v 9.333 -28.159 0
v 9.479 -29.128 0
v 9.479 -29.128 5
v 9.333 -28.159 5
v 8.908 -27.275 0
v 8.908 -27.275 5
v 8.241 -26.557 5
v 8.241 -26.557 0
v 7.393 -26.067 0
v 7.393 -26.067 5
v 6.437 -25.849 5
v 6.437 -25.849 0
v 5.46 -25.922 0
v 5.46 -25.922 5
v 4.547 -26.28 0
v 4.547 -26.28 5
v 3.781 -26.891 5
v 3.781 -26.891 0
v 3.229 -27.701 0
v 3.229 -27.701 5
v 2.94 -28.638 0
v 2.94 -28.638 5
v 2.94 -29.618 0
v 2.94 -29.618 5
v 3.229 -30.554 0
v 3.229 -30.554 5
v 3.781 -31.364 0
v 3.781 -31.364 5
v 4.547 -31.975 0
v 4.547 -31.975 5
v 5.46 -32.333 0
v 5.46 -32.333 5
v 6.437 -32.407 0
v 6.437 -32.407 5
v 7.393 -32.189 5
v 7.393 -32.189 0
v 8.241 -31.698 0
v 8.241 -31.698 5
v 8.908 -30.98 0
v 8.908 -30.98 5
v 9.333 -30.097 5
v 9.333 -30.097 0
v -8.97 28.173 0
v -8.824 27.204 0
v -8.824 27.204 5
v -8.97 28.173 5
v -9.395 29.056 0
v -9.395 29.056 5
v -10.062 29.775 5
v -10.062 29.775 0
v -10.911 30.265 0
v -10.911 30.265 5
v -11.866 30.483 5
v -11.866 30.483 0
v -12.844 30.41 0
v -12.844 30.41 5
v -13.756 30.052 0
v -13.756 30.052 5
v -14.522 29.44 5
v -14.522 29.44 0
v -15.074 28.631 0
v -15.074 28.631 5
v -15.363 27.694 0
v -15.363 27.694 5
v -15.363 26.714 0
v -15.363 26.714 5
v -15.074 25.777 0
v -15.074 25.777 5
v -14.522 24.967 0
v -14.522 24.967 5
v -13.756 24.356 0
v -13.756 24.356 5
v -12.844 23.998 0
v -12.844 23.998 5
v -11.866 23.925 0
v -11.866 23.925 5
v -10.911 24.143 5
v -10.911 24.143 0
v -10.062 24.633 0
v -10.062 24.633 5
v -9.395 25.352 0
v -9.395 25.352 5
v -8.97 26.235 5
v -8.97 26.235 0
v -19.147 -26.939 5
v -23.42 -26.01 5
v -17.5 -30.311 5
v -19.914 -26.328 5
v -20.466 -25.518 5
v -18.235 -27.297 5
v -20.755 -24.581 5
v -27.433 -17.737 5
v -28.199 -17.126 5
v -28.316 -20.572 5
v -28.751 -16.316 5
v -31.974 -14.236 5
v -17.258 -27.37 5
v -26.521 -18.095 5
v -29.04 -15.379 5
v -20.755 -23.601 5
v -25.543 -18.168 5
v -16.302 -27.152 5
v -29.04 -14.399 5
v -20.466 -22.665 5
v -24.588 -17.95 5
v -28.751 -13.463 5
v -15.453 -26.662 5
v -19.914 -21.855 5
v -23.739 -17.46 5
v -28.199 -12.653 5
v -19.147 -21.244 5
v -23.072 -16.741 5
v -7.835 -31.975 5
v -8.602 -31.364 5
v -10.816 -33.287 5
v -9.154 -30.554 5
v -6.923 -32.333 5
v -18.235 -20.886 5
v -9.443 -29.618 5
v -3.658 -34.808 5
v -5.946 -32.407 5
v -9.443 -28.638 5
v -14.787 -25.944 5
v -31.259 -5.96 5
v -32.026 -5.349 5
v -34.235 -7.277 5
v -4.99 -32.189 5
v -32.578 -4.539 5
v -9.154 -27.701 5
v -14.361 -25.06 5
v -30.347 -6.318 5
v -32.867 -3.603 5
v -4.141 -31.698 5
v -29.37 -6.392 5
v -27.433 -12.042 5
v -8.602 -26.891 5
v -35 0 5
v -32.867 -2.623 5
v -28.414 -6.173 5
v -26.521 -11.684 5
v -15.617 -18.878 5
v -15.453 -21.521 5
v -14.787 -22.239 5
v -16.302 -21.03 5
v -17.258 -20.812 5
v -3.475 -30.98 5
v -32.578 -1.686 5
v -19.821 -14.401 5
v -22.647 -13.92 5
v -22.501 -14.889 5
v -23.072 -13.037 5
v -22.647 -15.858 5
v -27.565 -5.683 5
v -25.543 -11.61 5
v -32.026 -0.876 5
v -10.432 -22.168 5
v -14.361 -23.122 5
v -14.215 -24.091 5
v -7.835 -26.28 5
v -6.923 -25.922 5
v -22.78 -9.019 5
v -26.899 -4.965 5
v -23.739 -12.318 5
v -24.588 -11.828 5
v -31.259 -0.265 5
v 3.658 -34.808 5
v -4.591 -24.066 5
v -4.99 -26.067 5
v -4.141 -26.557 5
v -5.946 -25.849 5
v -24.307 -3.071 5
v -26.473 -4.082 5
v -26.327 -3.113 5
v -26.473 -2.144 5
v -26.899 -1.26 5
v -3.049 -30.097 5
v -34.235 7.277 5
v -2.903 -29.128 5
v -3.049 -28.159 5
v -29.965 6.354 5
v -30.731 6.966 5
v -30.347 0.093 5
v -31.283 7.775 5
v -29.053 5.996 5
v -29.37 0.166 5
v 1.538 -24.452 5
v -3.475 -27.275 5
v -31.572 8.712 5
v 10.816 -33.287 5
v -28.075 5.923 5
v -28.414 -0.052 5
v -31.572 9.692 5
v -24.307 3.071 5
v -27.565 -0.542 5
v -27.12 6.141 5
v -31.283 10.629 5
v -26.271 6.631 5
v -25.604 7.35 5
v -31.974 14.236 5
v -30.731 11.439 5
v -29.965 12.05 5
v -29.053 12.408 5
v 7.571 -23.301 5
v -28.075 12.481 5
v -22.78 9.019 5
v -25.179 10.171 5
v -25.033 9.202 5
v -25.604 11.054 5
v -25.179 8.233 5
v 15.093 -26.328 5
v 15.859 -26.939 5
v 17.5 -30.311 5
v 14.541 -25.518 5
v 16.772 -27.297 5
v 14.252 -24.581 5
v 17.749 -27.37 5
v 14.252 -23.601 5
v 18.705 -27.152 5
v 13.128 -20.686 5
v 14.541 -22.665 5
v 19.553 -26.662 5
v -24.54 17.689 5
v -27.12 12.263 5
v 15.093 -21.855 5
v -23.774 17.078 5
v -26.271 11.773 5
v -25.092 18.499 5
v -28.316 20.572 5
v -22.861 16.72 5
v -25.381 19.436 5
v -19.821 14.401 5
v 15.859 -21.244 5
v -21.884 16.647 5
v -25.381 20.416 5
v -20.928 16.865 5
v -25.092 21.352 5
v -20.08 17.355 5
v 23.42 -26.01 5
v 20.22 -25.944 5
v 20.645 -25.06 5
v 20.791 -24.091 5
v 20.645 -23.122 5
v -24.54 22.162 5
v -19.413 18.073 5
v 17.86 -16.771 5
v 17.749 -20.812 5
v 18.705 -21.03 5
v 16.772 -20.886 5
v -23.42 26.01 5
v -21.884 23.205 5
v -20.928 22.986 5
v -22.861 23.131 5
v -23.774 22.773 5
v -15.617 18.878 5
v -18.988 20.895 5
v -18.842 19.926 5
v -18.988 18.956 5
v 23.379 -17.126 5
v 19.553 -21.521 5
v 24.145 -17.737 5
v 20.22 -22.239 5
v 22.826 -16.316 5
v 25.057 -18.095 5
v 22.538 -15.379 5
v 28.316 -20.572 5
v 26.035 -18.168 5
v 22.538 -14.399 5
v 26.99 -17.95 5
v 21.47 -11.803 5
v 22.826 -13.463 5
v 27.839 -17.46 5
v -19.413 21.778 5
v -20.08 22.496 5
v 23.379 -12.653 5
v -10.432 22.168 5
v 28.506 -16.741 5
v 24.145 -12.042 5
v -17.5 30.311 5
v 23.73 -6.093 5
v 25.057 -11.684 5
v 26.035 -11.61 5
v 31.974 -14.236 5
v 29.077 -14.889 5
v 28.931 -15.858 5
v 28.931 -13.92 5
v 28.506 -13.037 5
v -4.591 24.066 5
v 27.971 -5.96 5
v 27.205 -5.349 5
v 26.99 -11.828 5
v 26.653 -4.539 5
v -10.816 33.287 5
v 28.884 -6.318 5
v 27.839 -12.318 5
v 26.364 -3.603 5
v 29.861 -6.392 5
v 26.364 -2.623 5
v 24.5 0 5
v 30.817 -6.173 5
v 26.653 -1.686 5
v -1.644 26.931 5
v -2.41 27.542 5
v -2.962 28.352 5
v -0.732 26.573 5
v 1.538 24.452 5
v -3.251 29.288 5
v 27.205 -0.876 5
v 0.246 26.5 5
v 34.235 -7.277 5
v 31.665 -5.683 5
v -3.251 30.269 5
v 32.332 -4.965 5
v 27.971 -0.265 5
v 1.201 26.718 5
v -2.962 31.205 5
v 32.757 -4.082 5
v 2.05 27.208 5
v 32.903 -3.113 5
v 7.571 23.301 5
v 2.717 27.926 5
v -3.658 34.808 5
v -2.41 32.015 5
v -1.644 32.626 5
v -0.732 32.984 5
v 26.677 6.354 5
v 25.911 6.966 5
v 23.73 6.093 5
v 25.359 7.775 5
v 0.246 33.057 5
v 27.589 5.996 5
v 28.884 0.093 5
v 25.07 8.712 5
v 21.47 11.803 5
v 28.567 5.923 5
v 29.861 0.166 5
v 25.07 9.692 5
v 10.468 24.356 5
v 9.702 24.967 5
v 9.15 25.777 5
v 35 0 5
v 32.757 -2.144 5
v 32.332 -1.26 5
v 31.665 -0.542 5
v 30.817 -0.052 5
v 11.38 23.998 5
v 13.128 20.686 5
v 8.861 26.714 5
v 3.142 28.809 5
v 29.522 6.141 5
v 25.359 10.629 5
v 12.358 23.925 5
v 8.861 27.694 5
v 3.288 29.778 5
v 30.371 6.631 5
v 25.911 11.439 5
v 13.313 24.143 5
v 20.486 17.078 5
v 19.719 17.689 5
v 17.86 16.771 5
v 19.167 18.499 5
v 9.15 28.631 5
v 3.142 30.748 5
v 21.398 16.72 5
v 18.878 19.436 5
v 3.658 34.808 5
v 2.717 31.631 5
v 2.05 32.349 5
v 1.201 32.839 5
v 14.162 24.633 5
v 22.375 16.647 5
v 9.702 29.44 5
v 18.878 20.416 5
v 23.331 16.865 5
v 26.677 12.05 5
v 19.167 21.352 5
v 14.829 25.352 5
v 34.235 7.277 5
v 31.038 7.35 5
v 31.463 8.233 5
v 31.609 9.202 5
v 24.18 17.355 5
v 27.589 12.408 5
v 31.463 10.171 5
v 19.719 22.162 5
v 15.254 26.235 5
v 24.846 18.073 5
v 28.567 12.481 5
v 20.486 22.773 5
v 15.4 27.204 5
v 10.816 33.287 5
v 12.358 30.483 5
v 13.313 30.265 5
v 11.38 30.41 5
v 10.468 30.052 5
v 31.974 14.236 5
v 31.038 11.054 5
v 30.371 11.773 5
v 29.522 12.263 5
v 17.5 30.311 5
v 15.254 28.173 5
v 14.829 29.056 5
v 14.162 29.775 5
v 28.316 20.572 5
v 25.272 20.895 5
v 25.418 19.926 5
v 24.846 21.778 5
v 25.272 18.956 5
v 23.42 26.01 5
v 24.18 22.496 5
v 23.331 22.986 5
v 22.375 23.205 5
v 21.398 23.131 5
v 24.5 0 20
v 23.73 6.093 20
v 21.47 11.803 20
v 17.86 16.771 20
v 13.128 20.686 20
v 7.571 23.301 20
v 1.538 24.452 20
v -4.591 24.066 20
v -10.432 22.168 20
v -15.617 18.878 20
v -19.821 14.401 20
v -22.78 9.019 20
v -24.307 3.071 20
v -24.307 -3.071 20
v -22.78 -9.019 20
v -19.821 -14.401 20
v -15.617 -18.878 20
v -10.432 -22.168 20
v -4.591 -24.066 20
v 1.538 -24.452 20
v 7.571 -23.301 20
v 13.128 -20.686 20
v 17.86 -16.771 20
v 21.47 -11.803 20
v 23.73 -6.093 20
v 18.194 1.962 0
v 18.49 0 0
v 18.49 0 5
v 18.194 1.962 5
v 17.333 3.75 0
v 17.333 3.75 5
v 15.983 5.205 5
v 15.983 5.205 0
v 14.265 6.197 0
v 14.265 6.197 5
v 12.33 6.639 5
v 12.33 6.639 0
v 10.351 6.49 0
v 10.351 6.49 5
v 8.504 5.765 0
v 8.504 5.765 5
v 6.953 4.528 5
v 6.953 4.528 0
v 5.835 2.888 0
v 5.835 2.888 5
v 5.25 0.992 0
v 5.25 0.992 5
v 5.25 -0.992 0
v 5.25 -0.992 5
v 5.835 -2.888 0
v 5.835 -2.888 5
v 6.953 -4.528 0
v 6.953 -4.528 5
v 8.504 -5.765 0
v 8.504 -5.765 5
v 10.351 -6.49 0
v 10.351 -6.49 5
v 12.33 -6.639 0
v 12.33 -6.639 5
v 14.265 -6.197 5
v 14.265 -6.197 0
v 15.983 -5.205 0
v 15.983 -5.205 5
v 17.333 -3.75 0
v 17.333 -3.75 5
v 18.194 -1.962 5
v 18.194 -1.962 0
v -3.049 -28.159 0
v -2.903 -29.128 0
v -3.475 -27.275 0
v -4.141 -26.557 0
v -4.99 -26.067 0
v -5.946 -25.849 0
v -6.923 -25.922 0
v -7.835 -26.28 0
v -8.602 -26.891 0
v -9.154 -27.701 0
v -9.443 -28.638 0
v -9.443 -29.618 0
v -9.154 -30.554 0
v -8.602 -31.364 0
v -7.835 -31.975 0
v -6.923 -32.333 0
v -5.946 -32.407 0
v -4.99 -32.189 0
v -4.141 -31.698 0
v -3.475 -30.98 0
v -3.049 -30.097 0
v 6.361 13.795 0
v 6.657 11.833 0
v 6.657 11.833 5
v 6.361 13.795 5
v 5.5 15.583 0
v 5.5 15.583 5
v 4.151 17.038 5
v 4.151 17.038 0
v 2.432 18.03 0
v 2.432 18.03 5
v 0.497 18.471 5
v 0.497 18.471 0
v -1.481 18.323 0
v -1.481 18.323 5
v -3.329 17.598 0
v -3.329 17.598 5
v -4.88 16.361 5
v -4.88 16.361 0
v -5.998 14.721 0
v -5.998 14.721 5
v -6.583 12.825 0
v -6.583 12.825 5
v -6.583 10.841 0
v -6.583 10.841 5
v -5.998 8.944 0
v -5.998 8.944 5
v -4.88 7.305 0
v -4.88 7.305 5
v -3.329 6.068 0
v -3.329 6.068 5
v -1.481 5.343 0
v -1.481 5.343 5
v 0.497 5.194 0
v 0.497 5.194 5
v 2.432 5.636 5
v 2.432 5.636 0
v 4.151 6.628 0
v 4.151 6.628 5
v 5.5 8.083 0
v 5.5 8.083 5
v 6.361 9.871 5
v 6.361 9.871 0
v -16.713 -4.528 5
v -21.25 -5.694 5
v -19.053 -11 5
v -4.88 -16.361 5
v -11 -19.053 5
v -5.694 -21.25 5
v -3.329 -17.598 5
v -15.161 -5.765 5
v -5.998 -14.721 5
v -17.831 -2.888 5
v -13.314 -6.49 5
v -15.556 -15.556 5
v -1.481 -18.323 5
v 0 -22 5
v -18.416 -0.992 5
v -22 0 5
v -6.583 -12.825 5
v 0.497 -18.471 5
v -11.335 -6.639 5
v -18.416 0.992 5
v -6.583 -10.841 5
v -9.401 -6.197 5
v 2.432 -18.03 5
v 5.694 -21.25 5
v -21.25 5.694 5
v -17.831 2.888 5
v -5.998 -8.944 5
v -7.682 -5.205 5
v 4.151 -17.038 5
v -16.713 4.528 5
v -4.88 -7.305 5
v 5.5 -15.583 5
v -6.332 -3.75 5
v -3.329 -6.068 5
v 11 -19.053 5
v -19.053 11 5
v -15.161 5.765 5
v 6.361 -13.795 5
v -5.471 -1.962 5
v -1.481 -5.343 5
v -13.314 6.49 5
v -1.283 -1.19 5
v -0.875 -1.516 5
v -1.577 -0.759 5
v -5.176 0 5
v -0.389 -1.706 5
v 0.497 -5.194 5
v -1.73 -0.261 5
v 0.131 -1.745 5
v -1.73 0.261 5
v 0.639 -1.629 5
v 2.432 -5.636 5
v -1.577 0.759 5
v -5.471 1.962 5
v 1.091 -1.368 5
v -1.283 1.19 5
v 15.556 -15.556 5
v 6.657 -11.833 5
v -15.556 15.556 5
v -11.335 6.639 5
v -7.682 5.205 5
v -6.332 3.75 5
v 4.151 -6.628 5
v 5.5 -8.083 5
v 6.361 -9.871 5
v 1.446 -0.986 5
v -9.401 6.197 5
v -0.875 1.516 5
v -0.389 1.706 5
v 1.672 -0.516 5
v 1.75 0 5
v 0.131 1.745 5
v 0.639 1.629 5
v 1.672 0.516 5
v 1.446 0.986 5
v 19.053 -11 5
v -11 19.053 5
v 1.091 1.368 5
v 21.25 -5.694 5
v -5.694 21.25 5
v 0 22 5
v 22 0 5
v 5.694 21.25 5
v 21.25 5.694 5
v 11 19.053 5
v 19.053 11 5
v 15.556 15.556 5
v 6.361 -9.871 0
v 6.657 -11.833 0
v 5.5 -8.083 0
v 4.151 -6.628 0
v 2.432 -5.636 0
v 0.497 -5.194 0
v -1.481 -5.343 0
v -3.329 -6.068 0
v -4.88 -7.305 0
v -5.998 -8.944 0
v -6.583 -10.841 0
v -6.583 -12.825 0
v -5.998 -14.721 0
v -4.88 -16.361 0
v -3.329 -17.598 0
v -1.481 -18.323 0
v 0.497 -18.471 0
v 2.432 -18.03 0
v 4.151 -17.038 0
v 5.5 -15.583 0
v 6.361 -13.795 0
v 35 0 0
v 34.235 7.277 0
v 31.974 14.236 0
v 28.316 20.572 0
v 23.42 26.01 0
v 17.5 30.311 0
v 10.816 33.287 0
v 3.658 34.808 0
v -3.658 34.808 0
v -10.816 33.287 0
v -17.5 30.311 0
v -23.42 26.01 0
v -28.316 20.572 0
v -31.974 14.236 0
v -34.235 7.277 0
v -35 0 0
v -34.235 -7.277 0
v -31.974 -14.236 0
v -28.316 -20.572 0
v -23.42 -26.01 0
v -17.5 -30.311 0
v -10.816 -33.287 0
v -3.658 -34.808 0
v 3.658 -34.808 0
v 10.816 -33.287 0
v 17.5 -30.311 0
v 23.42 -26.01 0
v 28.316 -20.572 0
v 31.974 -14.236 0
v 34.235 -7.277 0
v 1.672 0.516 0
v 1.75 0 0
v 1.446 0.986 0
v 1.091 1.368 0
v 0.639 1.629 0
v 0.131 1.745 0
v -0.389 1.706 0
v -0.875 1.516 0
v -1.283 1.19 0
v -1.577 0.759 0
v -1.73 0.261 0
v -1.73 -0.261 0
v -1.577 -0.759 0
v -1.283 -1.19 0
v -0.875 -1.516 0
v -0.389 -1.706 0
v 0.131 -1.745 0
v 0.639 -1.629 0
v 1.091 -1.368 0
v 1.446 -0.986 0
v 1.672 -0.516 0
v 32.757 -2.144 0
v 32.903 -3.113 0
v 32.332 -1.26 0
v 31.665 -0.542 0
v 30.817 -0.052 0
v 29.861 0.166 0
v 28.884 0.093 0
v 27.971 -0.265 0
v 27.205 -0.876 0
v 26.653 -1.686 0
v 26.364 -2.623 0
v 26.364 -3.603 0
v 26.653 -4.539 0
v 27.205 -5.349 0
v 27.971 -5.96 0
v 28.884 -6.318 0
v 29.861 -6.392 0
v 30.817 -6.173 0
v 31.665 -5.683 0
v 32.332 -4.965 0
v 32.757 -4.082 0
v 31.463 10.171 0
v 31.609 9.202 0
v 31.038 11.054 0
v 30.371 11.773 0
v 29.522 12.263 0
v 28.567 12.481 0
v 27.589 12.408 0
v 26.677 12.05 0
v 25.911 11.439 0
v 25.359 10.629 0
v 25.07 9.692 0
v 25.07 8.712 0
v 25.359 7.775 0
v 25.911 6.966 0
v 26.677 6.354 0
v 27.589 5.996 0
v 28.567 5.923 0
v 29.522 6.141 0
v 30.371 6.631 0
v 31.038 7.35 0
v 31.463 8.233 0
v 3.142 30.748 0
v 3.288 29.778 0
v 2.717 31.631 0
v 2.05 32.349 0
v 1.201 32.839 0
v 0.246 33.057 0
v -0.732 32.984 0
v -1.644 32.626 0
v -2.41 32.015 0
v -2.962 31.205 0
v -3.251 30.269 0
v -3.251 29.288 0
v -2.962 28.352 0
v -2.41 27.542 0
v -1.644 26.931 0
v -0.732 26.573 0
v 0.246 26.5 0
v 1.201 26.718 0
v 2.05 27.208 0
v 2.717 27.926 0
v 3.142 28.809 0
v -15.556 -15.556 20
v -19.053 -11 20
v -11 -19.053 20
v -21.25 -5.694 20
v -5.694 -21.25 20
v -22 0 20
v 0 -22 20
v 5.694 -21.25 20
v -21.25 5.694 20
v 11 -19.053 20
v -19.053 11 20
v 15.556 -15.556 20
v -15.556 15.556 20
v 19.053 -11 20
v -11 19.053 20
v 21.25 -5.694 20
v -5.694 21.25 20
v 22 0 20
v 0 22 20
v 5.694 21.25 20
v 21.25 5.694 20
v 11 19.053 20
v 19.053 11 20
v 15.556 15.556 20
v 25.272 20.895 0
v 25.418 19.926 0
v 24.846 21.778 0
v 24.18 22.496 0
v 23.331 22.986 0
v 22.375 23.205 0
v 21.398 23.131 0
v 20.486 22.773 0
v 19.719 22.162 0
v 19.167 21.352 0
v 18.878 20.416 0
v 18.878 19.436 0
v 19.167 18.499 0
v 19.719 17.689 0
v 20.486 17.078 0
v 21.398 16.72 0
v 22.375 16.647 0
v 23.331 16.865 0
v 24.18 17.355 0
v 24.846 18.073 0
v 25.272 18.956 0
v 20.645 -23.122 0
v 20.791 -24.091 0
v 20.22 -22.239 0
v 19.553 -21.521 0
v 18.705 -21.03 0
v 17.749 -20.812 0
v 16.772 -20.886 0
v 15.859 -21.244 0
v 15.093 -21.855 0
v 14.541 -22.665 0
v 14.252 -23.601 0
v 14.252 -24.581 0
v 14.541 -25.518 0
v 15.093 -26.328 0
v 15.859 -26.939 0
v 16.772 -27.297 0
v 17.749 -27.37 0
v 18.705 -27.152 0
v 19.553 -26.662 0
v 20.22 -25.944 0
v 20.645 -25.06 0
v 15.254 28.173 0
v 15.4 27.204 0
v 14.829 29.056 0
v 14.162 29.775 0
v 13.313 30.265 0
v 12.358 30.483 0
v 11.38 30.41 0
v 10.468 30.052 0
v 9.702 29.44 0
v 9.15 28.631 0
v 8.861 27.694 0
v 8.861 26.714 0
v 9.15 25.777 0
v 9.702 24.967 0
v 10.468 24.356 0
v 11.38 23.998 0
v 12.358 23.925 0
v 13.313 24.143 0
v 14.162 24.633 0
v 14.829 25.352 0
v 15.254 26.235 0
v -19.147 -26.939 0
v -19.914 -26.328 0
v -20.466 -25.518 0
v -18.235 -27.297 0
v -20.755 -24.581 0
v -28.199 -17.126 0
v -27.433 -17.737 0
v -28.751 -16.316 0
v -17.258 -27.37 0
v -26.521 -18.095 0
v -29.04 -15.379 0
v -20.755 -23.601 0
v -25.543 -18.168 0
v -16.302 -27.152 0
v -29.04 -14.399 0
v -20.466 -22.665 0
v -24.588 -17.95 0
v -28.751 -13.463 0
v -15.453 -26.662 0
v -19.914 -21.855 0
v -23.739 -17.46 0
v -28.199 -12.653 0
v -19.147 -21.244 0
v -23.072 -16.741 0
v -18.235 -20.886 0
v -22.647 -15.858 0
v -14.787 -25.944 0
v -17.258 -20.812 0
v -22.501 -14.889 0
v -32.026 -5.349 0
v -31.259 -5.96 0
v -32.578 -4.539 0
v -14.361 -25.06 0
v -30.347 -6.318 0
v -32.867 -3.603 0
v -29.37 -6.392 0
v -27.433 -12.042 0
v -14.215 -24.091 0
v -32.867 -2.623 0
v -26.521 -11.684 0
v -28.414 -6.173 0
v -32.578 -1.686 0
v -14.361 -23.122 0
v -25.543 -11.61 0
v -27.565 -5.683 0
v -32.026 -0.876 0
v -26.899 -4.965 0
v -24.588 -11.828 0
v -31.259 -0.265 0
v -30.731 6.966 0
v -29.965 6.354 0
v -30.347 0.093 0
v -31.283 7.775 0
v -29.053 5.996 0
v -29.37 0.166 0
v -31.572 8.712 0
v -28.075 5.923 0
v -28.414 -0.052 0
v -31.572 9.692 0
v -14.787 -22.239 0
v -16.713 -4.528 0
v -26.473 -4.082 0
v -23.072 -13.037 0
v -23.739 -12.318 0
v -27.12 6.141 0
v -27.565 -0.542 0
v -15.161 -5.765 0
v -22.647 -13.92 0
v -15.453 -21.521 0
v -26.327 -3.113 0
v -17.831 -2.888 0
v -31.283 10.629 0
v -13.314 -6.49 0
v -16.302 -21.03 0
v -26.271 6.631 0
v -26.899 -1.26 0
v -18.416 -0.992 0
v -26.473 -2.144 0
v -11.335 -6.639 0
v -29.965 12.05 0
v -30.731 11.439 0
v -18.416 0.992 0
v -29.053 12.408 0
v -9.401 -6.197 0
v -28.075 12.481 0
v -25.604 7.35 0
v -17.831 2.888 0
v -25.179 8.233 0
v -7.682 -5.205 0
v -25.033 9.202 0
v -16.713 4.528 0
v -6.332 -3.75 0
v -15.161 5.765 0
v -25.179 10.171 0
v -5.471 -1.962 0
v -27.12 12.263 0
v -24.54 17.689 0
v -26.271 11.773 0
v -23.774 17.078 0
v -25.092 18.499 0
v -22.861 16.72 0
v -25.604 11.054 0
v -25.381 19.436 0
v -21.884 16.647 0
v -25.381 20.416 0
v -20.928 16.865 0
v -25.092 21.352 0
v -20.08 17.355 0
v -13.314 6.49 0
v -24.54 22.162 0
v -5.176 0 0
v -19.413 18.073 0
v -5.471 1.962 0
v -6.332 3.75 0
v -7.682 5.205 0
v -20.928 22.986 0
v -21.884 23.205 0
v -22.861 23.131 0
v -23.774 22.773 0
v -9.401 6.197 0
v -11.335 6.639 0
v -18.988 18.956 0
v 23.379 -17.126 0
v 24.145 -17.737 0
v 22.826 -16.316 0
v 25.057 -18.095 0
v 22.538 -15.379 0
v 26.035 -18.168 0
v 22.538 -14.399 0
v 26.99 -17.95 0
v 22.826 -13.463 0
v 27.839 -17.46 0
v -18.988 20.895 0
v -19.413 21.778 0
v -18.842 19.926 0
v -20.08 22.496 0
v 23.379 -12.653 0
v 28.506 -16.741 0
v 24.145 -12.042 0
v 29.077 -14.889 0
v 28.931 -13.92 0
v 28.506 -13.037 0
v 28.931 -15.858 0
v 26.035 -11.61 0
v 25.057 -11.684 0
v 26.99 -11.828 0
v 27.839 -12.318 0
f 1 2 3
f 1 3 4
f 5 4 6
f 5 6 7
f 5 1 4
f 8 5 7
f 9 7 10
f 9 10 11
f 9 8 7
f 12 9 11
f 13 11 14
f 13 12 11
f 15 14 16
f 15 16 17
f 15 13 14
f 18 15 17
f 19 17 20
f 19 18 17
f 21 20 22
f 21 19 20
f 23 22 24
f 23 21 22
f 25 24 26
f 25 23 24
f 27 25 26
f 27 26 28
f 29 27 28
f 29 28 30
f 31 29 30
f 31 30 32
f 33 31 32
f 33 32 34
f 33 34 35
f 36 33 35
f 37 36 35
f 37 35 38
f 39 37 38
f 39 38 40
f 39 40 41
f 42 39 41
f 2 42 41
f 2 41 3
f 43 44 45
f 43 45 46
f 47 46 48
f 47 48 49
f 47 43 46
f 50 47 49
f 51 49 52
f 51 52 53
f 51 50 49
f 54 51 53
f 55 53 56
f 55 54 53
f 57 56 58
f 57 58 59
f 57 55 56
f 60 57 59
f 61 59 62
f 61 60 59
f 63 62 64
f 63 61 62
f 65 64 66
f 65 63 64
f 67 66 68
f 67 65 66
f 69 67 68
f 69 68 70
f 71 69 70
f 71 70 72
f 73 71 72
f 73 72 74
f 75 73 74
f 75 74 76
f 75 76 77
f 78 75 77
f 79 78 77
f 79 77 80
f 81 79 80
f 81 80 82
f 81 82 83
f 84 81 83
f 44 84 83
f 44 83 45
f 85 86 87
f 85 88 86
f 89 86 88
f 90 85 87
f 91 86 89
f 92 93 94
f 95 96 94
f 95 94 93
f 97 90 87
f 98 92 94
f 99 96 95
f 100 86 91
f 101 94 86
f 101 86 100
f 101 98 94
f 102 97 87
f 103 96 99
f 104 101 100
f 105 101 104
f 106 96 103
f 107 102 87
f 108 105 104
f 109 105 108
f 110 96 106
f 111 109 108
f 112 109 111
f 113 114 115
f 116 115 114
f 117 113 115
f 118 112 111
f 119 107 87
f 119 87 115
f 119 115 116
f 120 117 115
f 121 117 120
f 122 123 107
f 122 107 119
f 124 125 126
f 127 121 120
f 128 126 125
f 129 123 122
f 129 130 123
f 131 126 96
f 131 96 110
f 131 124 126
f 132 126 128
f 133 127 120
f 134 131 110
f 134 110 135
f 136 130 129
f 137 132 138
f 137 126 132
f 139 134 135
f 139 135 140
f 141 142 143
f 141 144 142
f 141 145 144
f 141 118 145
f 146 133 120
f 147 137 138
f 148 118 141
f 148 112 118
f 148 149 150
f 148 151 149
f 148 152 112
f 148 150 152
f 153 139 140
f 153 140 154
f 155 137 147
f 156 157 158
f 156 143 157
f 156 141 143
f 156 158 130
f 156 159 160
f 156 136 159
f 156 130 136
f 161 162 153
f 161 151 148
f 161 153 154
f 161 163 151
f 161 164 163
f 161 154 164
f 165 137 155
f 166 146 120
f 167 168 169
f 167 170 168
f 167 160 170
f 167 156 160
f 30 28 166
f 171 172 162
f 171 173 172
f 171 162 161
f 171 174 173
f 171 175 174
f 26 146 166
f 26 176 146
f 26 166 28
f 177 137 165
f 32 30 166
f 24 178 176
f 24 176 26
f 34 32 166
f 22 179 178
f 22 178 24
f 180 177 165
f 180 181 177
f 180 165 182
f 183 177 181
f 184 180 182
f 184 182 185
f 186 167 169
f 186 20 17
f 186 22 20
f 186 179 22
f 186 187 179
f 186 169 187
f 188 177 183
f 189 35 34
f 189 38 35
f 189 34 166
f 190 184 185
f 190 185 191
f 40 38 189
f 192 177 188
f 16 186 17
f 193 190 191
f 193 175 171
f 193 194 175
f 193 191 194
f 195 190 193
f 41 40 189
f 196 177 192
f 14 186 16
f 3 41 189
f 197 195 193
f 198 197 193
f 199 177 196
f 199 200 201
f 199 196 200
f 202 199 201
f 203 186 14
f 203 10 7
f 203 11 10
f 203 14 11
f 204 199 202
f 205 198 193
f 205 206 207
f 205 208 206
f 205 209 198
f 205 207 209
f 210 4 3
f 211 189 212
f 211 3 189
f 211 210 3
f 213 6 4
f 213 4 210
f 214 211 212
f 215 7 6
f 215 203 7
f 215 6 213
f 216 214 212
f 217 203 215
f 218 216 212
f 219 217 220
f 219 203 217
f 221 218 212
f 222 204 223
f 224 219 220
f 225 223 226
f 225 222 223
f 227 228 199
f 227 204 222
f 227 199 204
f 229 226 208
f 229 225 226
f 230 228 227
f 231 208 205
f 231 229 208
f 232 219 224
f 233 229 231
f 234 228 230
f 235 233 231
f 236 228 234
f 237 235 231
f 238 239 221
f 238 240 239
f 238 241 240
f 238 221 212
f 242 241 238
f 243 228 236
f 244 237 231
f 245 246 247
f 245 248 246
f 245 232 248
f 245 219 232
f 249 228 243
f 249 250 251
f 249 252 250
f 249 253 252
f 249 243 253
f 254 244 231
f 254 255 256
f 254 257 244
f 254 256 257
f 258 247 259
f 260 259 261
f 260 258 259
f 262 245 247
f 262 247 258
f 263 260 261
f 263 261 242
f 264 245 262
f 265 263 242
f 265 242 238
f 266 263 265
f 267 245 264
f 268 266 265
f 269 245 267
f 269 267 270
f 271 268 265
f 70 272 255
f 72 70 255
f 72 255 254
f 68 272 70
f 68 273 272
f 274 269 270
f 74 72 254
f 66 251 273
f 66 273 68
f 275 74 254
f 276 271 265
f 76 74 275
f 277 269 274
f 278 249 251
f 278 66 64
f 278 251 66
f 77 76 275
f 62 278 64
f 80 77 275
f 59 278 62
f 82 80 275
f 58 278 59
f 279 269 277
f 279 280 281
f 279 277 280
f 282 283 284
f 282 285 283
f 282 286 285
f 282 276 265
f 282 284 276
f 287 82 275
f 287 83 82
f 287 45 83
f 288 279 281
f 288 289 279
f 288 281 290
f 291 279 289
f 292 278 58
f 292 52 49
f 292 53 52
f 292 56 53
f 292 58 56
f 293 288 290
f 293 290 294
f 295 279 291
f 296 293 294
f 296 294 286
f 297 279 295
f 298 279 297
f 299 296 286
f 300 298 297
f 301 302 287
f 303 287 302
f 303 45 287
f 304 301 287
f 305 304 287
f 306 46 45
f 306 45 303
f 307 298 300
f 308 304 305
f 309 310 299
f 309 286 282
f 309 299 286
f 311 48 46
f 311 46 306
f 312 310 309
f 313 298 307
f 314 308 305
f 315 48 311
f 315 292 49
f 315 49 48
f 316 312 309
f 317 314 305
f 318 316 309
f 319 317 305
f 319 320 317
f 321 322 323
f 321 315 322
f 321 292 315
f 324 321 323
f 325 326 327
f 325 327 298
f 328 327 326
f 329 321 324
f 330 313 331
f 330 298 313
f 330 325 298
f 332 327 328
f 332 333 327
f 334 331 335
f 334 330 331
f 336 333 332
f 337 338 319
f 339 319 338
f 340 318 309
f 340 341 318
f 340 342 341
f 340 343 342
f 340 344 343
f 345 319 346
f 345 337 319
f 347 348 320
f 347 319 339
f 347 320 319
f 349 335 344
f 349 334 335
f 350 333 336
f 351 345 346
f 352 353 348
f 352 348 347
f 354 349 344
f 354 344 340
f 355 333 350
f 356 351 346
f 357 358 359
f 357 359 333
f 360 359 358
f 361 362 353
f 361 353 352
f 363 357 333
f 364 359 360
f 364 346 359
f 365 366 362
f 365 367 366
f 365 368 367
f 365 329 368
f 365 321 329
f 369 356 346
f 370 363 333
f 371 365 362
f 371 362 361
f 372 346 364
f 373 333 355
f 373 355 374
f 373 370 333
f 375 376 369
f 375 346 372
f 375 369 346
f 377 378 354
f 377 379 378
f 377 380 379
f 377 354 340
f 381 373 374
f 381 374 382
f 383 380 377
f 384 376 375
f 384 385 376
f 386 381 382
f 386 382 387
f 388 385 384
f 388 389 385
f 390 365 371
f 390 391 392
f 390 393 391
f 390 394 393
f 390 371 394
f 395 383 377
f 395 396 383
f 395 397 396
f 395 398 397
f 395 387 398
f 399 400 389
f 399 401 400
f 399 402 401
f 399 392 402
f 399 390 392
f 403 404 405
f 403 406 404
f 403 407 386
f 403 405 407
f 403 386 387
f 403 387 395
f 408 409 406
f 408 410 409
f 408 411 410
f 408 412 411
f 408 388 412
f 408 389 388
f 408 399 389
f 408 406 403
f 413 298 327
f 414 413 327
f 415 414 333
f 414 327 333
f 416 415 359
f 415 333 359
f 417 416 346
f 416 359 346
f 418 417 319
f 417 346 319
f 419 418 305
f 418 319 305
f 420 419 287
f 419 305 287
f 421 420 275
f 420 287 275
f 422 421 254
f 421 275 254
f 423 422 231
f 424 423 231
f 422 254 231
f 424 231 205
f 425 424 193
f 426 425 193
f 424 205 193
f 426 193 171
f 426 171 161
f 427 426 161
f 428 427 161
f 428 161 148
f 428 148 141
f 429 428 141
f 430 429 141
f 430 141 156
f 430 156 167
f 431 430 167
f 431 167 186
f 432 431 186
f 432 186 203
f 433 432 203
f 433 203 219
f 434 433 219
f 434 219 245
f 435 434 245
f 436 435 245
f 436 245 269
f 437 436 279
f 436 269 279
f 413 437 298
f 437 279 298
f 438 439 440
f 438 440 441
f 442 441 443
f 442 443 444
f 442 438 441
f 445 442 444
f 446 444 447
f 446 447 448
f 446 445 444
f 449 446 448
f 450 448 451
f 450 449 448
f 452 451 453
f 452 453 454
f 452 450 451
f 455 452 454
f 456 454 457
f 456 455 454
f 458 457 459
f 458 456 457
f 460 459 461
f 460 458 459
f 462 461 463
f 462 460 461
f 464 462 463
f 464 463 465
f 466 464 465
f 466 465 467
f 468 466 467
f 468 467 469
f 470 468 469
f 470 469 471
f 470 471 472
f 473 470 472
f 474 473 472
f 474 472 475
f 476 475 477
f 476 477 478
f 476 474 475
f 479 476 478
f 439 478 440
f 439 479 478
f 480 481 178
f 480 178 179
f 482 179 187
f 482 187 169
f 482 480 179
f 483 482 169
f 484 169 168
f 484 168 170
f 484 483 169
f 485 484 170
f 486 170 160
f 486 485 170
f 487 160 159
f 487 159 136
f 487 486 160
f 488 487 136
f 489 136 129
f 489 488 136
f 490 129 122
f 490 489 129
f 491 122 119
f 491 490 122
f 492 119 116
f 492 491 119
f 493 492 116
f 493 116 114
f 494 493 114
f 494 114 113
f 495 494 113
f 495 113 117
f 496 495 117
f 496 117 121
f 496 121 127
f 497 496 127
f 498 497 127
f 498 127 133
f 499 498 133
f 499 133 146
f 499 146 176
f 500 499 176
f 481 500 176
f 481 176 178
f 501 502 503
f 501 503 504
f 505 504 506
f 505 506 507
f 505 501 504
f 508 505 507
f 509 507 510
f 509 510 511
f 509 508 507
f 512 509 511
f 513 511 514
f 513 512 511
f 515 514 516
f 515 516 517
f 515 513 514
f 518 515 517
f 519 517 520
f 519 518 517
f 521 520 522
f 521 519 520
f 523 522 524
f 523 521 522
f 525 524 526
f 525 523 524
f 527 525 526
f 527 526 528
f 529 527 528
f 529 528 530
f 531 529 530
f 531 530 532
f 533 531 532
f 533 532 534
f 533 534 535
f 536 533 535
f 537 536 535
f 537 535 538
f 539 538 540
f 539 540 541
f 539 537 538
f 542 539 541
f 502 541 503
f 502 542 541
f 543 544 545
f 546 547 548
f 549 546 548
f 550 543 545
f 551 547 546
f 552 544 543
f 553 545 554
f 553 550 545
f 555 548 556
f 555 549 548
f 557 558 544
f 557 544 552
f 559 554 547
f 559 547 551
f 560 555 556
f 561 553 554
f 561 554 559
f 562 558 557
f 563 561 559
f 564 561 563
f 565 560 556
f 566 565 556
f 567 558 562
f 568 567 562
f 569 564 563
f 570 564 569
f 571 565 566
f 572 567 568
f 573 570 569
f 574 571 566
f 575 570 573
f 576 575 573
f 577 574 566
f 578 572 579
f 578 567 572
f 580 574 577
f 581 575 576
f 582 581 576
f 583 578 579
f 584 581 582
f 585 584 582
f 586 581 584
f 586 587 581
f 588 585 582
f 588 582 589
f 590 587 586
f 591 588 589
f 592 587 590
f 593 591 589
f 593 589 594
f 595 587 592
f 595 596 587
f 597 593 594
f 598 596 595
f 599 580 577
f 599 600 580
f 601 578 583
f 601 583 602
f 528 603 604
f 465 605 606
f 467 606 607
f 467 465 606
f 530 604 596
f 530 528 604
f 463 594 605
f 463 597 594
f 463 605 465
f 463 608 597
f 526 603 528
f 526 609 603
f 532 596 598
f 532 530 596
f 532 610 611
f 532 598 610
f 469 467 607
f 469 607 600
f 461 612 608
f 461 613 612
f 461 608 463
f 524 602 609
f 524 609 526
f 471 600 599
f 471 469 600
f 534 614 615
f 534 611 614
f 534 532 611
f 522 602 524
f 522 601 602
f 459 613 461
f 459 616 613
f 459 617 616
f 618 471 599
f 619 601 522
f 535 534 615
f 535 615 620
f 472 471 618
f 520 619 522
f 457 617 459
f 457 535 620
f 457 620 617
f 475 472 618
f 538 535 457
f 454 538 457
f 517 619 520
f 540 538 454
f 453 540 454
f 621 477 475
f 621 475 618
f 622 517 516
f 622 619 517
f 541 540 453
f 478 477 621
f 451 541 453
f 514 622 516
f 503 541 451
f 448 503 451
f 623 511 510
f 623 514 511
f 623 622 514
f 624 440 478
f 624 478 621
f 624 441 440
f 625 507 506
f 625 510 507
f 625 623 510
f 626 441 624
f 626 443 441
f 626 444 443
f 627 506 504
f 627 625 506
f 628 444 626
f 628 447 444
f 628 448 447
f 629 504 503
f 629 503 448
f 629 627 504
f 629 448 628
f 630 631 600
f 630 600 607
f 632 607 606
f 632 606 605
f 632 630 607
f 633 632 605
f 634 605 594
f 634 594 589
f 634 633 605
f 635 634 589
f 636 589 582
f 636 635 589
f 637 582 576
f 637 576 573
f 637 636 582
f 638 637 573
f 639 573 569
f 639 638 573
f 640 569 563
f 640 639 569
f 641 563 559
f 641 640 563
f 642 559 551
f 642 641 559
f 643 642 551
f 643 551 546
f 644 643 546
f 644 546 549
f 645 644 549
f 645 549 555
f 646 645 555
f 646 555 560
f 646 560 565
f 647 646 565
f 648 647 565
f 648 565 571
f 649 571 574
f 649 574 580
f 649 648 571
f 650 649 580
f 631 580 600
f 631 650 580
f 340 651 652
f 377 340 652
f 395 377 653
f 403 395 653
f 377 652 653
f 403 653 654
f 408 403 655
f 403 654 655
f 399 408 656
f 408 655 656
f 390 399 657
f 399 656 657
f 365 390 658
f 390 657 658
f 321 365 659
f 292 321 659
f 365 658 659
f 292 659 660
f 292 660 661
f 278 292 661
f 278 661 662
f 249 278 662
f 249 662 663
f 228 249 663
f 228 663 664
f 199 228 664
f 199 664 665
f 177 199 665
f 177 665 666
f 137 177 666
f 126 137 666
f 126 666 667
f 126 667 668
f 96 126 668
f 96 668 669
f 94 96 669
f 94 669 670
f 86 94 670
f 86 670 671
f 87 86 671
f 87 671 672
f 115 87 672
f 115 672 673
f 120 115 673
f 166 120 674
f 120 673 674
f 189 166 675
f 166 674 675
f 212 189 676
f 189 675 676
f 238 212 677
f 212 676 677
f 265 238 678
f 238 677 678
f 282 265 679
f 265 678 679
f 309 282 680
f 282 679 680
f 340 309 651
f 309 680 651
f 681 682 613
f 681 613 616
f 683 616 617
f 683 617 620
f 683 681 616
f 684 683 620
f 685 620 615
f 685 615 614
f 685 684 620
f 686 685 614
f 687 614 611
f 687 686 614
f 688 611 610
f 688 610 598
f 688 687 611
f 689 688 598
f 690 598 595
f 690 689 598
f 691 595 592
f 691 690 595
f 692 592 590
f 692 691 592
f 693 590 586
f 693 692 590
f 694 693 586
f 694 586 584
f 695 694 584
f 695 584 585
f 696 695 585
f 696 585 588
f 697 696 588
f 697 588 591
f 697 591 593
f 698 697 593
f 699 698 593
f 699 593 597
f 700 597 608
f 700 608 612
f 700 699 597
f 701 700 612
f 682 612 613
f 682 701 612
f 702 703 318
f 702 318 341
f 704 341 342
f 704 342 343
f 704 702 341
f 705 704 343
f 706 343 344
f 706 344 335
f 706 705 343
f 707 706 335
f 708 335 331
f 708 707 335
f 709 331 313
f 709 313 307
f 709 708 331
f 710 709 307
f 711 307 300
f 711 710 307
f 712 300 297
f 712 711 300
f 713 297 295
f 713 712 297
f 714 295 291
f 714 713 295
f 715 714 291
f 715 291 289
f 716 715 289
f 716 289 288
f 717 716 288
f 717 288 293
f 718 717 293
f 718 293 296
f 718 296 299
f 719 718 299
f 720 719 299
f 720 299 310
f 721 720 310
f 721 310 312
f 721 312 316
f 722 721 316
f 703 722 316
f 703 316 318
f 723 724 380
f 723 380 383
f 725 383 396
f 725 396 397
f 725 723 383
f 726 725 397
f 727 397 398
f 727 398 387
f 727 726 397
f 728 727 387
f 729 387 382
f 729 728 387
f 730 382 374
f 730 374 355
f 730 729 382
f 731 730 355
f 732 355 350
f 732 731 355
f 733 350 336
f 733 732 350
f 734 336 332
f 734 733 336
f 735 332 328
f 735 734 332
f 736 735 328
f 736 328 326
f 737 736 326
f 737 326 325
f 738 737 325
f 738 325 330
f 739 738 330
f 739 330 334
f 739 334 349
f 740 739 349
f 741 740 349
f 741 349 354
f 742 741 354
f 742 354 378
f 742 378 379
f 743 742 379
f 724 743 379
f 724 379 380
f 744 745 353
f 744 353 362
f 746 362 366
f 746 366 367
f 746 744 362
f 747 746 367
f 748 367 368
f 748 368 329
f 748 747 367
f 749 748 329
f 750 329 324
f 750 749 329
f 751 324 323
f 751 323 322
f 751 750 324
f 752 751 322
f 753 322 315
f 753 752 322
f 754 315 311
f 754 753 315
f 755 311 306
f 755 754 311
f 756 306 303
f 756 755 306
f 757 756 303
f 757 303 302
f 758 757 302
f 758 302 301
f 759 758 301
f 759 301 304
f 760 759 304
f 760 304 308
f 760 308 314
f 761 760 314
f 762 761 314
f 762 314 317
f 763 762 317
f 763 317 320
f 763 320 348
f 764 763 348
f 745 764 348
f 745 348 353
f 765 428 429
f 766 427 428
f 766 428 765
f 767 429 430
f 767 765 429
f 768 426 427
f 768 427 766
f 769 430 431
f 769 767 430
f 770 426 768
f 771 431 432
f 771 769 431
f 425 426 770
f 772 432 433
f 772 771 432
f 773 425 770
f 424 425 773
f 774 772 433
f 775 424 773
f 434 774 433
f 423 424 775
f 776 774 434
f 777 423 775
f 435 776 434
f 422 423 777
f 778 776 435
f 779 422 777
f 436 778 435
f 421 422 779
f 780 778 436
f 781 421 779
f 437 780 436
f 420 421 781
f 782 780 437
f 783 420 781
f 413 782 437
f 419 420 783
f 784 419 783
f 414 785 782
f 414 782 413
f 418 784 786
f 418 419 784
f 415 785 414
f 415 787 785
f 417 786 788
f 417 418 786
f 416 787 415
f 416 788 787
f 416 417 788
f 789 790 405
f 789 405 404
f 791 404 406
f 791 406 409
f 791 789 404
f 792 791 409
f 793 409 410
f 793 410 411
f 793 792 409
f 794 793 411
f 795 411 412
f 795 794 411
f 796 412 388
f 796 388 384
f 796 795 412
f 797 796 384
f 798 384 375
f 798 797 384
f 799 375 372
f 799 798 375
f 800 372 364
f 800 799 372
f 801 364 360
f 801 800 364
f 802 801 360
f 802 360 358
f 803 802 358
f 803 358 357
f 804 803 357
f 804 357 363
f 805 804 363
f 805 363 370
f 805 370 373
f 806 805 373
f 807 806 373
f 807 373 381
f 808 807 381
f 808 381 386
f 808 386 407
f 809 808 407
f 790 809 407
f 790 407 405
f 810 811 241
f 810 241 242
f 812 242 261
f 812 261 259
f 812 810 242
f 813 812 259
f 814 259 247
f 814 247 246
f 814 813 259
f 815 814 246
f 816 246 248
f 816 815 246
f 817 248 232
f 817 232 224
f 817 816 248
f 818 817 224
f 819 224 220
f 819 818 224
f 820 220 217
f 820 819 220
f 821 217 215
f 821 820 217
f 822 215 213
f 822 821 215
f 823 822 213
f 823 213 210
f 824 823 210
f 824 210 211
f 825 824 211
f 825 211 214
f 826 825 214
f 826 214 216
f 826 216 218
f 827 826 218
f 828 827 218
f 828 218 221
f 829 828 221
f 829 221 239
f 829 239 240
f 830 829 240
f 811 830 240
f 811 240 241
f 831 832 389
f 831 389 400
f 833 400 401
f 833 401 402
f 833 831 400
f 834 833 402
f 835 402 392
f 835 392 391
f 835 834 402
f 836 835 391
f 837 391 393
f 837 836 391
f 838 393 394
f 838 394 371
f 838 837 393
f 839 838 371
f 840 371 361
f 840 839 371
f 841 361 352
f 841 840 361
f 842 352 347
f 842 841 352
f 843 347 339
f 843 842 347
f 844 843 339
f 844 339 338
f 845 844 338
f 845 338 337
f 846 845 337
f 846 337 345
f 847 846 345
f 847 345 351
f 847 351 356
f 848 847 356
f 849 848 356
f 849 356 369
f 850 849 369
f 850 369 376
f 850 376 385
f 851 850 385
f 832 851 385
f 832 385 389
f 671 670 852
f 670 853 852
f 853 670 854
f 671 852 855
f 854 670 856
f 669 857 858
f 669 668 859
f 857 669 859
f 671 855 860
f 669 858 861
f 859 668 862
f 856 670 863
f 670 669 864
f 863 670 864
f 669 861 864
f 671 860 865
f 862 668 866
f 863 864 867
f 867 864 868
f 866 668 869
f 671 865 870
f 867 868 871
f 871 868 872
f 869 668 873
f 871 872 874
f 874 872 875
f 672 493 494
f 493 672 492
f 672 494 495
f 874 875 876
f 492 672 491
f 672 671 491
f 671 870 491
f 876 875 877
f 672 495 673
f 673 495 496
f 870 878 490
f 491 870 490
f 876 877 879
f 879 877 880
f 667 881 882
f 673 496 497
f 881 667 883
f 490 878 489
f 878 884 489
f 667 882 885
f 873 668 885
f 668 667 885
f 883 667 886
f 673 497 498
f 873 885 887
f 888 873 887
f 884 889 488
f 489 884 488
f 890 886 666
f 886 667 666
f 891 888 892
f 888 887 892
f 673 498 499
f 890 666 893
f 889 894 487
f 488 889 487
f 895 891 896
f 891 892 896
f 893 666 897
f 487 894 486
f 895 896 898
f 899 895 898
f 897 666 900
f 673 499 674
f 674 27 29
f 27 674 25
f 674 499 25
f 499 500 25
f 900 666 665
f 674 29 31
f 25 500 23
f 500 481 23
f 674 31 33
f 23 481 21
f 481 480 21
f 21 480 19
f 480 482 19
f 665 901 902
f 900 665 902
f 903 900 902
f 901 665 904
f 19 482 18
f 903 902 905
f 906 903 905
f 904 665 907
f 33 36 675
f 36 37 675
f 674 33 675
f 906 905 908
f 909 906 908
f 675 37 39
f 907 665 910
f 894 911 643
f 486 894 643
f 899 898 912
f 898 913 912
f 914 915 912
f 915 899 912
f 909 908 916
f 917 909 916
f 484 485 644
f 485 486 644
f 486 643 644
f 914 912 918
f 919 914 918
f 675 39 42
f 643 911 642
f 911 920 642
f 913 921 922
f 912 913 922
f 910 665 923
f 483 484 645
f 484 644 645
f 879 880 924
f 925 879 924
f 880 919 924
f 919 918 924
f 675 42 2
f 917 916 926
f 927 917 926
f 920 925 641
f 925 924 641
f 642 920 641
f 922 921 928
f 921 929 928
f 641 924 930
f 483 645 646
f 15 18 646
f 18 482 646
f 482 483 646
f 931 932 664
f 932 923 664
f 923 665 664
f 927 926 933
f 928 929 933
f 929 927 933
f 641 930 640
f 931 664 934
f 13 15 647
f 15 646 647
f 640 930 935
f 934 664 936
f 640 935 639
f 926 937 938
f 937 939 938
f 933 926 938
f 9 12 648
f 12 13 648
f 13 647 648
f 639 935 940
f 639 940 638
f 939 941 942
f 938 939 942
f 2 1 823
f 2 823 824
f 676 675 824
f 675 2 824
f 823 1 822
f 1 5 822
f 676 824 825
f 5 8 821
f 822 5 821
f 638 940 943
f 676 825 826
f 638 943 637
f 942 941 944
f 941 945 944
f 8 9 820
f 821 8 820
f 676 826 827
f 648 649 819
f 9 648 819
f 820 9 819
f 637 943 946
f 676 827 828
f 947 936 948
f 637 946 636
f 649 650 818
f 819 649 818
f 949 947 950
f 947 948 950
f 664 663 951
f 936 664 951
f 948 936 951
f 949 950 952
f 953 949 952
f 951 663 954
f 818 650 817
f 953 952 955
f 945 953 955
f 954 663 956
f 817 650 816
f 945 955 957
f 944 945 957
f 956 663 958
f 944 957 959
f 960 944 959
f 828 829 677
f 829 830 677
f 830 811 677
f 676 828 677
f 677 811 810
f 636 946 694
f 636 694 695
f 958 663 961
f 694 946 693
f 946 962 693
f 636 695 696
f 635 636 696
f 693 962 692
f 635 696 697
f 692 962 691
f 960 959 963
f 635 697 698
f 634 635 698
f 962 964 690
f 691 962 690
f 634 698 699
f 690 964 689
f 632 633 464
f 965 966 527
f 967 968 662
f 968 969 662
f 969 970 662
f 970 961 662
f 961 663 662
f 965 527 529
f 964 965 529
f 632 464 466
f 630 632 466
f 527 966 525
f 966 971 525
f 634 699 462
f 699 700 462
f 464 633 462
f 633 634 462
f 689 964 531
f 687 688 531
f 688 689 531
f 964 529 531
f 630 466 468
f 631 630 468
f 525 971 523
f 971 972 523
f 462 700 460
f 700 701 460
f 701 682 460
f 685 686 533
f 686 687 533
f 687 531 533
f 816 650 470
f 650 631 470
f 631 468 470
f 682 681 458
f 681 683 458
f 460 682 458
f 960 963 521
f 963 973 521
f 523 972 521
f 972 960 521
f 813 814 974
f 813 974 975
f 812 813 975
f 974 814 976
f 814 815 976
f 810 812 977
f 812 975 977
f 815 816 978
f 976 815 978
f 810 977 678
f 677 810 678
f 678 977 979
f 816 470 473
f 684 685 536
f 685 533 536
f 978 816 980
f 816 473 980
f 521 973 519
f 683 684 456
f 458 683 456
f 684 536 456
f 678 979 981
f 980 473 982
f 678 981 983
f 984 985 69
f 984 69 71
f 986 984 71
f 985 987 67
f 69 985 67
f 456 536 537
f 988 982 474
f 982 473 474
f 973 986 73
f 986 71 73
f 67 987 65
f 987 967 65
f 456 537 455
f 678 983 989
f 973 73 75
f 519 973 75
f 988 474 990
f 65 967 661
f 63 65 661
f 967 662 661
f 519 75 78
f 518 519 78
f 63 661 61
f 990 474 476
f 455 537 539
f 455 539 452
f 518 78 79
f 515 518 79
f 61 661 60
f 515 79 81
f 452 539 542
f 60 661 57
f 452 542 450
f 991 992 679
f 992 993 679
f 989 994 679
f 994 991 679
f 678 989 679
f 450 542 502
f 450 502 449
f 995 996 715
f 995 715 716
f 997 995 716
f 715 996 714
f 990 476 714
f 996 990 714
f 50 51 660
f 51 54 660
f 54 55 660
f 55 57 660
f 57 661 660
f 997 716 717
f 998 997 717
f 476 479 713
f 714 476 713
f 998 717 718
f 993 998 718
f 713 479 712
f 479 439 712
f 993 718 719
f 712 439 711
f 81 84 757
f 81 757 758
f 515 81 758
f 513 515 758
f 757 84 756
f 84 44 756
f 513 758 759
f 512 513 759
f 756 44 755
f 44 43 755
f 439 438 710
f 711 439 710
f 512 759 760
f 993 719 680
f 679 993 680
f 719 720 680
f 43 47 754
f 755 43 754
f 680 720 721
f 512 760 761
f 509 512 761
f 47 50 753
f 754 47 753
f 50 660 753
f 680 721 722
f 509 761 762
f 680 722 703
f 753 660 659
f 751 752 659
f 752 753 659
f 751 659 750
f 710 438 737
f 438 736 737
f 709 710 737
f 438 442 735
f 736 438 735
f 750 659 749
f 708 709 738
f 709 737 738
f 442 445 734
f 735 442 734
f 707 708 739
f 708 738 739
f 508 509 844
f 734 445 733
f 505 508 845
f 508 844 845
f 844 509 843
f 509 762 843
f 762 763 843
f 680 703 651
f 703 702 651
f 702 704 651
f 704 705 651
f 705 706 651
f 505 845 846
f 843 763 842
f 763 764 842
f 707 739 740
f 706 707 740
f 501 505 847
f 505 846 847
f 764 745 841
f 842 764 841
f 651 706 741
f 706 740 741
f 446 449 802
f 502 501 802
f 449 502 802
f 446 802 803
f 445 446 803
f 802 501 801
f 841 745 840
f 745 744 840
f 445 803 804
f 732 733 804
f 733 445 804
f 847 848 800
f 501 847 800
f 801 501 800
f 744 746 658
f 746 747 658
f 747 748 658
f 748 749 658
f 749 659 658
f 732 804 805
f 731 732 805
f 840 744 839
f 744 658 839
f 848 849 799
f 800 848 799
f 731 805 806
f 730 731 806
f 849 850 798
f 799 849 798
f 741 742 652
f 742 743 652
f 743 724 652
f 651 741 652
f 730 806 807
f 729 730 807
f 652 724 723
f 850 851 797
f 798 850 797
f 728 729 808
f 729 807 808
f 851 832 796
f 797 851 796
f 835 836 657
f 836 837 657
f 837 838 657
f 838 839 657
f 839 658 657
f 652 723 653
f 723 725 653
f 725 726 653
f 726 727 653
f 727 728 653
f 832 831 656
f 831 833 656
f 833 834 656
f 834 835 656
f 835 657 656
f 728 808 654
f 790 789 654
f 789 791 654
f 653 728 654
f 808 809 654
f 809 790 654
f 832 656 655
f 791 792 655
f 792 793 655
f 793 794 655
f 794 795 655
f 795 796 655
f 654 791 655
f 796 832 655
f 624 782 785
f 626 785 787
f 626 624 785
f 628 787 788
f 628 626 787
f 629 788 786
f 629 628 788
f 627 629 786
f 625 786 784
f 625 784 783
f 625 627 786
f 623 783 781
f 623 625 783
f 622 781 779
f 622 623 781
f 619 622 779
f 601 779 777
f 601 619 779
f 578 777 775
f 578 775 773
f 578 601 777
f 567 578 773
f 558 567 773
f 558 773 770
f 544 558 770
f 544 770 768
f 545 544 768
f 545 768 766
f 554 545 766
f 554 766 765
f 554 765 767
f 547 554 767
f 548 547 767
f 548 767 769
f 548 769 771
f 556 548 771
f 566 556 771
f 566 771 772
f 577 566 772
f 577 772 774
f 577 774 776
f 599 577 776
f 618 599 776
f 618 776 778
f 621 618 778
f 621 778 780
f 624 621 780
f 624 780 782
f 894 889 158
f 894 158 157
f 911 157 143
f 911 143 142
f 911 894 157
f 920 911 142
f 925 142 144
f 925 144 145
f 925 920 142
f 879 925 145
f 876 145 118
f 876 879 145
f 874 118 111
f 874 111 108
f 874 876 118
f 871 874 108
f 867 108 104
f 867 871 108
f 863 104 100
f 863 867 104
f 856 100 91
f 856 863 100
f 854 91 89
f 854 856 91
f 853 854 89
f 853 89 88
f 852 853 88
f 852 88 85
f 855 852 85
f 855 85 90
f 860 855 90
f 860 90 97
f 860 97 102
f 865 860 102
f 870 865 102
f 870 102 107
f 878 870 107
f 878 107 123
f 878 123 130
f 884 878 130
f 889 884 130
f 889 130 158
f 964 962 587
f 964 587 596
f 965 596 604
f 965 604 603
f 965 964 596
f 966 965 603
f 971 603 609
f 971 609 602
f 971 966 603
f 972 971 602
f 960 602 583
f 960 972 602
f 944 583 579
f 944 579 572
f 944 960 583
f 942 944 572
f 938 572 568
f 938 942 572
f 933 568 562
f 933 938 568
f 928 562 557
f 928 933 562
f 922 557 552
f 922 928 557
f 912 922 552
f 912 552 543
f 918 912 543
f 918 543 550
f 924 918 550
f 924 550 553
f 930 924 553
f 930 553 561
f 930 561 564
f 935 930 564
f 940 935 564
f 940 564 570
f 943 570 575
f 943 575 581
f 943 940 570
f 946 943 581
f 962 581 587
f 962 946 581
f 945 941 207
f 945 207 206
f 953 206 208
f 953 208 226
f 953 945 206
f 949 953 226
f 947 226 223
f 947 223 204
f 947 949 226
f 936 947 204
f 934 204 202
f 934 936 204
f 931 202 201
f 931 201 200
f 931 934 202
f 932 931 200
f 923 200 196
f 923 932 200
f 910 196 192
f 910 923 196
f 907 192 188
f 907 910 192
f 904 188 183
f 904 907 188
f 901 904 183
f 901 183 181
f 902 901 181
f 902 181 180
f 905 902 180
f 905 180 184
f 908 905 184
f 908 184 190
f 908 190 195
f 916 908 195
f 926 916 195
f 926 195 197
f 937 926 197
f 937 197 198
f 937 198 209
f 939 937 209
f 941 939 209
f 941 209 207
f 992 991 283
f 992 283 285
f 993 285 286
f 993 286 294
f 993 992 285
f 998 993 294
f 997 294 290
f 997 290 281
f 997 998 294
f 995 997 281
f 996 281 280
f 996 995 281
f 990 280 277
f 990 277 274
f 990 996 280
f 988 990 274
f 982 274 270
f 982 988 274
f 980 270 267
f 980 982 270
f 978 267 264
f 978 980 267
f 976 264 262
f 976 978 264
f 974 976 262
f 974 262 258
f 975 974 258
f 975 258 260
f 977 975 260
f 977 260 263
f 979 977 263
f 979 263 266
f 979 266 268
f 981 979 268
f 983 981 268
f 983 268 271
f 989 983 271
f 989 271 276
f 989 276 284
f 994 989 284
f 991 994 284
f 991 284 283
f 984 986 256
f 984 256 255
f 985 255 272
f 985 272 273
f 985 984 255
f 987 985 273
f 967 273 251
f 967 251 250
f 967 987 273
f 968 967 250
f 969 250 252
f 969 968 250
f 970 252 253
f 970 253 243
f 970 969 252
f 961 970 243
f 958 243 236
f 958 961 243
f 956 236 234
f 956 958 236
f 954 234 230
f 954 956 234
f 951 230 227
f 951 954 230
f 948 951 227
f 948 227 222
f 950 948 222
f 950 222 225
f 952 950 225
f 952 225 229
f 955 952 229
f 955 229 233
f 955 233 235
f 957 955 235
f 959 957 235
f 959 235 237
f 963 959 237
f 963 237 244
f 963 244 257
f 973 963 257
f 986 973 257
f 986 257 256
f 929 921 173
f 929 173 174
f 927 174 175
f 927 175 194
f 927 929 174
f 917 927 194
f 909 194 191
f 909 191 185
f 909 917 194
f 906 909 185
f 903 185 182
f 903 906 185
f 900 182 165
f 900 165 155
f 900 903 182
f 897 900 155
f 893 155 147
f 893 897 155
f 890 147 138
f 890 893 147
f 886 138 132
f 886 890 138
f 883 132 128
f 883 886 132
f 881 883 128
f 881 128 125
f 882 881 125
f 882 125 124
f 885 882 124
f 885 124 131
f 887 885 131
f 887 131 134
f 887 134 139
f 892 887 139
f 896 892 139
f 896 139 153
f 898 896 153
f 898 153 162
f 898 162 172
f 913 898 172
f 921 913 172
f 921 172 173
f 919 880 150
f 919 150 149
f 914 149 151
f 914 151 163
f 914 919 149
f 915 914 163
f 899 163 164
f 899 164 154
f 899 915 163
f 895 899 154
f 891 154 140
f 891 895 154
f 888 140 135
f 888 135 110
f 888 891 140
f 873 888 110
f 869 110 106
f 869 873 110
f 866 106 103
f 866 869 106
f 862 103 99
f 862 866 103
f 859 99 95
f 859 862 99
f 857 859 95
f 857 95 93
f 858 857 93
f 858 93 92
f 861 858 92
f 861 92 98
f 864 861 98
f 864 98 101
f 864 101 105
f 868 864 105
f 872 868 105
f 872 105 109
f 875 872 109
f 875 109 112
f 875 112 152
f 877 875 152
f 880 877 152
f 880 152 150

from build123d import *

# Parameters (mm, degrees)
F0_R     = 35
F0_R_2   = 3.2880949383
F0_R_3   = 24.5
F0_R_4   = 22
F0_R_5   = 6.6571375288
F0_R_6   = 1.75
F1_DEPTH = 5
F2_DEPTH = 20
F3_DEPTH = 3


with BuildPart() as f1:
    # F0 (on Top) → F1 (new body)
    with BuildSketch(Plane.XY):
        Circle(F0_R)
        with Locations((-17.5033363634, -24.0912757185)):
            Circle(F0_R_2, mode=Mode.SUBTRACT)
        with Locations((-6.1912888152, -29.1277237765)):
            Circle(F0_R_2, mode=Mode.SUBTRACT)
        with Locations((-25.7888980415, -14.8892272264)):
            Circle(F0_R_2, mode=Mode.SUBTRACT)
        with Locations((-29.6153249635, -3.1126960824)):
            Circle(F0_R_2, mode=Mode.SUBTRACT)
        with Locations((6.1912888152, -29.1277237765)):
            Circle(F0_R_2, mode=Mode.SUBTRACT)
        with Locations((17.5033363634, -24.0912757185)):
            Circle(F0_R_2, mode=Mode.SUBTRACT)
        with Locations((25.7888980415, -14.8892272264)):
            Circle(F0_R_2, mode=Mode.SUBTRACT)
        with Locations((29.6153249635, -3.1126960824)):
            Circle(F0_R_2, mode=Mode.SUBTRACT)
        with Locations((-28.3209931525, 9.2020484921)):
            Circle(F0_R_2, mode=Mode.SUBTRACT)
        with Locations((-22.1297043373, 19.9256752844)):
            Circle(F0_R_2, mode=Mode.SUBTRACT)
        with Locations((-12.1119886001, 27.2039718009)):
            Circle(F0_R_2, mode=Mode.SUBTRACT)
        Circle(F0_R_3, mode=Mode.SUBTRACT)
        with Locations((28.3209931525, 9.2020484921)):
            Circle(F0_R_2, mode=Mode.SUBTRACT)
        with Locations((0, 29.7784544528)):
            Circle(F0_R_2, mode=Mode.SUBTRACT)
        with Locations((12.1119886001, 27.2039718009)):
            Circle(F0_R_2, mode=Mode.SUBTRACT)
        with Locations((22.1297043373, 19.9256752844)):
            Circle(F0_R_2, mode=Mode.SUBTRACT)
        Circle(F0_R_3)
        Circle(F0_R_4, mode=Mode.SUBTRACT)
        Circle(F0_R_4)
        with Locations((0, -11.8328090757)):
            Circle(F0_R_5, mode=Mode.SUBTRACT)
        with Locations((-11.8328090757, 0)):
            Circle(F0_R_5, mode=Mode.SUBTRACT)
        Circle(F0_R_6, mode=Mode.SUBTRACT)
        with Locations((11.8328090757, 0)):
            Circle(F0_R_5, mode=Mode.SUBTRACT)
        with Locations((0, 11.8328090757)):
            Circle(F0_R_5, mode=Mode.SUBTRACT)
    extrude(amount=F1_DEPTH)

    # F0 (on Top) → F2 (join)
    with BuildSketch(Plane.XY):
        Circle(F0_R_3)
        Circle(F0_R_4, mode=Mode.SUBTRACT)
    extrude(amount=F2_DEPTH)

    # F0 (on Top) → F3 (join)
    with BuildSketch(Plane.XY):
        Circle(F0_R)
        with Locations((-17.5033363634, -24.0912757185)):
            Circle(F0_R_2, mode=Mode.SUBTRACT)
        with Locations((-6.1912888152, -29.1277237765)):
            Circle(F0_R_2, mode=Mode.SUBTRACT)
        with Locations((-25.7888980415, -14.8892272264)):
            Circle(F0_R_2, mode=Mode.SUBTRACT)
        with Locations((-29.6153249635, -3.1126960824)):
            Circle(F0_R_2, mode=Mode.SUBTRACT)
        with Locations((6.1912888152, -29.1277237765)):
            Circle(F0_R_2, mode=Mode.SUBTRACT)
        with Locations((17.5033363634, -24.0912757185)):
            Circle(F0_R_2, mode=Mode.SUBTRACT)
        with Locations((25.7888980415, -14.8892272264)):
            Circle(F0_R_2, mode=Mode.SUBTRACT)
        with Locations((29.6153249635, -3.1126960824)):
            Circle(F0_R_2, mode=Mode.SUBTRACT)
        with Locations((-28.3209931525, 9.2020484921)):
            Circle(F0_R_2, mode=Mode.SUBTRACT)
        with Locations((-22.1297043373, 19.9256752844)):
            Circle(F0_R_2, mode=Mode.SUBTRACT)
        with Locations((-12.1119886001, 27.2039718009)):
            Circle(F0_R_2, mode=Mode.SUBTRACT)
        Circle(F0_R_3, mode=Mode.SUBTRACT)
        with Locations((28.3209931525, 9.2020484921)):
            Circle(F0_R_2, mode=Mode.SUBTRACT)
        with Locations((0, 29.7784544528)):
            Circle(F0_R_2, mode=Mode.SUBTRACT)
        with Locations((12.1119886001, 27.2039718009)):
            Circle(F0_R_2, mode=Mode.SUBTRACT)
        with Locations((22.1297043373, 19.9256752844)):
            Circle(F0_R_2, mode=Mode.SUBTRACT)
    extrude(amount=F3_DEPTH)


solid = f1.part
